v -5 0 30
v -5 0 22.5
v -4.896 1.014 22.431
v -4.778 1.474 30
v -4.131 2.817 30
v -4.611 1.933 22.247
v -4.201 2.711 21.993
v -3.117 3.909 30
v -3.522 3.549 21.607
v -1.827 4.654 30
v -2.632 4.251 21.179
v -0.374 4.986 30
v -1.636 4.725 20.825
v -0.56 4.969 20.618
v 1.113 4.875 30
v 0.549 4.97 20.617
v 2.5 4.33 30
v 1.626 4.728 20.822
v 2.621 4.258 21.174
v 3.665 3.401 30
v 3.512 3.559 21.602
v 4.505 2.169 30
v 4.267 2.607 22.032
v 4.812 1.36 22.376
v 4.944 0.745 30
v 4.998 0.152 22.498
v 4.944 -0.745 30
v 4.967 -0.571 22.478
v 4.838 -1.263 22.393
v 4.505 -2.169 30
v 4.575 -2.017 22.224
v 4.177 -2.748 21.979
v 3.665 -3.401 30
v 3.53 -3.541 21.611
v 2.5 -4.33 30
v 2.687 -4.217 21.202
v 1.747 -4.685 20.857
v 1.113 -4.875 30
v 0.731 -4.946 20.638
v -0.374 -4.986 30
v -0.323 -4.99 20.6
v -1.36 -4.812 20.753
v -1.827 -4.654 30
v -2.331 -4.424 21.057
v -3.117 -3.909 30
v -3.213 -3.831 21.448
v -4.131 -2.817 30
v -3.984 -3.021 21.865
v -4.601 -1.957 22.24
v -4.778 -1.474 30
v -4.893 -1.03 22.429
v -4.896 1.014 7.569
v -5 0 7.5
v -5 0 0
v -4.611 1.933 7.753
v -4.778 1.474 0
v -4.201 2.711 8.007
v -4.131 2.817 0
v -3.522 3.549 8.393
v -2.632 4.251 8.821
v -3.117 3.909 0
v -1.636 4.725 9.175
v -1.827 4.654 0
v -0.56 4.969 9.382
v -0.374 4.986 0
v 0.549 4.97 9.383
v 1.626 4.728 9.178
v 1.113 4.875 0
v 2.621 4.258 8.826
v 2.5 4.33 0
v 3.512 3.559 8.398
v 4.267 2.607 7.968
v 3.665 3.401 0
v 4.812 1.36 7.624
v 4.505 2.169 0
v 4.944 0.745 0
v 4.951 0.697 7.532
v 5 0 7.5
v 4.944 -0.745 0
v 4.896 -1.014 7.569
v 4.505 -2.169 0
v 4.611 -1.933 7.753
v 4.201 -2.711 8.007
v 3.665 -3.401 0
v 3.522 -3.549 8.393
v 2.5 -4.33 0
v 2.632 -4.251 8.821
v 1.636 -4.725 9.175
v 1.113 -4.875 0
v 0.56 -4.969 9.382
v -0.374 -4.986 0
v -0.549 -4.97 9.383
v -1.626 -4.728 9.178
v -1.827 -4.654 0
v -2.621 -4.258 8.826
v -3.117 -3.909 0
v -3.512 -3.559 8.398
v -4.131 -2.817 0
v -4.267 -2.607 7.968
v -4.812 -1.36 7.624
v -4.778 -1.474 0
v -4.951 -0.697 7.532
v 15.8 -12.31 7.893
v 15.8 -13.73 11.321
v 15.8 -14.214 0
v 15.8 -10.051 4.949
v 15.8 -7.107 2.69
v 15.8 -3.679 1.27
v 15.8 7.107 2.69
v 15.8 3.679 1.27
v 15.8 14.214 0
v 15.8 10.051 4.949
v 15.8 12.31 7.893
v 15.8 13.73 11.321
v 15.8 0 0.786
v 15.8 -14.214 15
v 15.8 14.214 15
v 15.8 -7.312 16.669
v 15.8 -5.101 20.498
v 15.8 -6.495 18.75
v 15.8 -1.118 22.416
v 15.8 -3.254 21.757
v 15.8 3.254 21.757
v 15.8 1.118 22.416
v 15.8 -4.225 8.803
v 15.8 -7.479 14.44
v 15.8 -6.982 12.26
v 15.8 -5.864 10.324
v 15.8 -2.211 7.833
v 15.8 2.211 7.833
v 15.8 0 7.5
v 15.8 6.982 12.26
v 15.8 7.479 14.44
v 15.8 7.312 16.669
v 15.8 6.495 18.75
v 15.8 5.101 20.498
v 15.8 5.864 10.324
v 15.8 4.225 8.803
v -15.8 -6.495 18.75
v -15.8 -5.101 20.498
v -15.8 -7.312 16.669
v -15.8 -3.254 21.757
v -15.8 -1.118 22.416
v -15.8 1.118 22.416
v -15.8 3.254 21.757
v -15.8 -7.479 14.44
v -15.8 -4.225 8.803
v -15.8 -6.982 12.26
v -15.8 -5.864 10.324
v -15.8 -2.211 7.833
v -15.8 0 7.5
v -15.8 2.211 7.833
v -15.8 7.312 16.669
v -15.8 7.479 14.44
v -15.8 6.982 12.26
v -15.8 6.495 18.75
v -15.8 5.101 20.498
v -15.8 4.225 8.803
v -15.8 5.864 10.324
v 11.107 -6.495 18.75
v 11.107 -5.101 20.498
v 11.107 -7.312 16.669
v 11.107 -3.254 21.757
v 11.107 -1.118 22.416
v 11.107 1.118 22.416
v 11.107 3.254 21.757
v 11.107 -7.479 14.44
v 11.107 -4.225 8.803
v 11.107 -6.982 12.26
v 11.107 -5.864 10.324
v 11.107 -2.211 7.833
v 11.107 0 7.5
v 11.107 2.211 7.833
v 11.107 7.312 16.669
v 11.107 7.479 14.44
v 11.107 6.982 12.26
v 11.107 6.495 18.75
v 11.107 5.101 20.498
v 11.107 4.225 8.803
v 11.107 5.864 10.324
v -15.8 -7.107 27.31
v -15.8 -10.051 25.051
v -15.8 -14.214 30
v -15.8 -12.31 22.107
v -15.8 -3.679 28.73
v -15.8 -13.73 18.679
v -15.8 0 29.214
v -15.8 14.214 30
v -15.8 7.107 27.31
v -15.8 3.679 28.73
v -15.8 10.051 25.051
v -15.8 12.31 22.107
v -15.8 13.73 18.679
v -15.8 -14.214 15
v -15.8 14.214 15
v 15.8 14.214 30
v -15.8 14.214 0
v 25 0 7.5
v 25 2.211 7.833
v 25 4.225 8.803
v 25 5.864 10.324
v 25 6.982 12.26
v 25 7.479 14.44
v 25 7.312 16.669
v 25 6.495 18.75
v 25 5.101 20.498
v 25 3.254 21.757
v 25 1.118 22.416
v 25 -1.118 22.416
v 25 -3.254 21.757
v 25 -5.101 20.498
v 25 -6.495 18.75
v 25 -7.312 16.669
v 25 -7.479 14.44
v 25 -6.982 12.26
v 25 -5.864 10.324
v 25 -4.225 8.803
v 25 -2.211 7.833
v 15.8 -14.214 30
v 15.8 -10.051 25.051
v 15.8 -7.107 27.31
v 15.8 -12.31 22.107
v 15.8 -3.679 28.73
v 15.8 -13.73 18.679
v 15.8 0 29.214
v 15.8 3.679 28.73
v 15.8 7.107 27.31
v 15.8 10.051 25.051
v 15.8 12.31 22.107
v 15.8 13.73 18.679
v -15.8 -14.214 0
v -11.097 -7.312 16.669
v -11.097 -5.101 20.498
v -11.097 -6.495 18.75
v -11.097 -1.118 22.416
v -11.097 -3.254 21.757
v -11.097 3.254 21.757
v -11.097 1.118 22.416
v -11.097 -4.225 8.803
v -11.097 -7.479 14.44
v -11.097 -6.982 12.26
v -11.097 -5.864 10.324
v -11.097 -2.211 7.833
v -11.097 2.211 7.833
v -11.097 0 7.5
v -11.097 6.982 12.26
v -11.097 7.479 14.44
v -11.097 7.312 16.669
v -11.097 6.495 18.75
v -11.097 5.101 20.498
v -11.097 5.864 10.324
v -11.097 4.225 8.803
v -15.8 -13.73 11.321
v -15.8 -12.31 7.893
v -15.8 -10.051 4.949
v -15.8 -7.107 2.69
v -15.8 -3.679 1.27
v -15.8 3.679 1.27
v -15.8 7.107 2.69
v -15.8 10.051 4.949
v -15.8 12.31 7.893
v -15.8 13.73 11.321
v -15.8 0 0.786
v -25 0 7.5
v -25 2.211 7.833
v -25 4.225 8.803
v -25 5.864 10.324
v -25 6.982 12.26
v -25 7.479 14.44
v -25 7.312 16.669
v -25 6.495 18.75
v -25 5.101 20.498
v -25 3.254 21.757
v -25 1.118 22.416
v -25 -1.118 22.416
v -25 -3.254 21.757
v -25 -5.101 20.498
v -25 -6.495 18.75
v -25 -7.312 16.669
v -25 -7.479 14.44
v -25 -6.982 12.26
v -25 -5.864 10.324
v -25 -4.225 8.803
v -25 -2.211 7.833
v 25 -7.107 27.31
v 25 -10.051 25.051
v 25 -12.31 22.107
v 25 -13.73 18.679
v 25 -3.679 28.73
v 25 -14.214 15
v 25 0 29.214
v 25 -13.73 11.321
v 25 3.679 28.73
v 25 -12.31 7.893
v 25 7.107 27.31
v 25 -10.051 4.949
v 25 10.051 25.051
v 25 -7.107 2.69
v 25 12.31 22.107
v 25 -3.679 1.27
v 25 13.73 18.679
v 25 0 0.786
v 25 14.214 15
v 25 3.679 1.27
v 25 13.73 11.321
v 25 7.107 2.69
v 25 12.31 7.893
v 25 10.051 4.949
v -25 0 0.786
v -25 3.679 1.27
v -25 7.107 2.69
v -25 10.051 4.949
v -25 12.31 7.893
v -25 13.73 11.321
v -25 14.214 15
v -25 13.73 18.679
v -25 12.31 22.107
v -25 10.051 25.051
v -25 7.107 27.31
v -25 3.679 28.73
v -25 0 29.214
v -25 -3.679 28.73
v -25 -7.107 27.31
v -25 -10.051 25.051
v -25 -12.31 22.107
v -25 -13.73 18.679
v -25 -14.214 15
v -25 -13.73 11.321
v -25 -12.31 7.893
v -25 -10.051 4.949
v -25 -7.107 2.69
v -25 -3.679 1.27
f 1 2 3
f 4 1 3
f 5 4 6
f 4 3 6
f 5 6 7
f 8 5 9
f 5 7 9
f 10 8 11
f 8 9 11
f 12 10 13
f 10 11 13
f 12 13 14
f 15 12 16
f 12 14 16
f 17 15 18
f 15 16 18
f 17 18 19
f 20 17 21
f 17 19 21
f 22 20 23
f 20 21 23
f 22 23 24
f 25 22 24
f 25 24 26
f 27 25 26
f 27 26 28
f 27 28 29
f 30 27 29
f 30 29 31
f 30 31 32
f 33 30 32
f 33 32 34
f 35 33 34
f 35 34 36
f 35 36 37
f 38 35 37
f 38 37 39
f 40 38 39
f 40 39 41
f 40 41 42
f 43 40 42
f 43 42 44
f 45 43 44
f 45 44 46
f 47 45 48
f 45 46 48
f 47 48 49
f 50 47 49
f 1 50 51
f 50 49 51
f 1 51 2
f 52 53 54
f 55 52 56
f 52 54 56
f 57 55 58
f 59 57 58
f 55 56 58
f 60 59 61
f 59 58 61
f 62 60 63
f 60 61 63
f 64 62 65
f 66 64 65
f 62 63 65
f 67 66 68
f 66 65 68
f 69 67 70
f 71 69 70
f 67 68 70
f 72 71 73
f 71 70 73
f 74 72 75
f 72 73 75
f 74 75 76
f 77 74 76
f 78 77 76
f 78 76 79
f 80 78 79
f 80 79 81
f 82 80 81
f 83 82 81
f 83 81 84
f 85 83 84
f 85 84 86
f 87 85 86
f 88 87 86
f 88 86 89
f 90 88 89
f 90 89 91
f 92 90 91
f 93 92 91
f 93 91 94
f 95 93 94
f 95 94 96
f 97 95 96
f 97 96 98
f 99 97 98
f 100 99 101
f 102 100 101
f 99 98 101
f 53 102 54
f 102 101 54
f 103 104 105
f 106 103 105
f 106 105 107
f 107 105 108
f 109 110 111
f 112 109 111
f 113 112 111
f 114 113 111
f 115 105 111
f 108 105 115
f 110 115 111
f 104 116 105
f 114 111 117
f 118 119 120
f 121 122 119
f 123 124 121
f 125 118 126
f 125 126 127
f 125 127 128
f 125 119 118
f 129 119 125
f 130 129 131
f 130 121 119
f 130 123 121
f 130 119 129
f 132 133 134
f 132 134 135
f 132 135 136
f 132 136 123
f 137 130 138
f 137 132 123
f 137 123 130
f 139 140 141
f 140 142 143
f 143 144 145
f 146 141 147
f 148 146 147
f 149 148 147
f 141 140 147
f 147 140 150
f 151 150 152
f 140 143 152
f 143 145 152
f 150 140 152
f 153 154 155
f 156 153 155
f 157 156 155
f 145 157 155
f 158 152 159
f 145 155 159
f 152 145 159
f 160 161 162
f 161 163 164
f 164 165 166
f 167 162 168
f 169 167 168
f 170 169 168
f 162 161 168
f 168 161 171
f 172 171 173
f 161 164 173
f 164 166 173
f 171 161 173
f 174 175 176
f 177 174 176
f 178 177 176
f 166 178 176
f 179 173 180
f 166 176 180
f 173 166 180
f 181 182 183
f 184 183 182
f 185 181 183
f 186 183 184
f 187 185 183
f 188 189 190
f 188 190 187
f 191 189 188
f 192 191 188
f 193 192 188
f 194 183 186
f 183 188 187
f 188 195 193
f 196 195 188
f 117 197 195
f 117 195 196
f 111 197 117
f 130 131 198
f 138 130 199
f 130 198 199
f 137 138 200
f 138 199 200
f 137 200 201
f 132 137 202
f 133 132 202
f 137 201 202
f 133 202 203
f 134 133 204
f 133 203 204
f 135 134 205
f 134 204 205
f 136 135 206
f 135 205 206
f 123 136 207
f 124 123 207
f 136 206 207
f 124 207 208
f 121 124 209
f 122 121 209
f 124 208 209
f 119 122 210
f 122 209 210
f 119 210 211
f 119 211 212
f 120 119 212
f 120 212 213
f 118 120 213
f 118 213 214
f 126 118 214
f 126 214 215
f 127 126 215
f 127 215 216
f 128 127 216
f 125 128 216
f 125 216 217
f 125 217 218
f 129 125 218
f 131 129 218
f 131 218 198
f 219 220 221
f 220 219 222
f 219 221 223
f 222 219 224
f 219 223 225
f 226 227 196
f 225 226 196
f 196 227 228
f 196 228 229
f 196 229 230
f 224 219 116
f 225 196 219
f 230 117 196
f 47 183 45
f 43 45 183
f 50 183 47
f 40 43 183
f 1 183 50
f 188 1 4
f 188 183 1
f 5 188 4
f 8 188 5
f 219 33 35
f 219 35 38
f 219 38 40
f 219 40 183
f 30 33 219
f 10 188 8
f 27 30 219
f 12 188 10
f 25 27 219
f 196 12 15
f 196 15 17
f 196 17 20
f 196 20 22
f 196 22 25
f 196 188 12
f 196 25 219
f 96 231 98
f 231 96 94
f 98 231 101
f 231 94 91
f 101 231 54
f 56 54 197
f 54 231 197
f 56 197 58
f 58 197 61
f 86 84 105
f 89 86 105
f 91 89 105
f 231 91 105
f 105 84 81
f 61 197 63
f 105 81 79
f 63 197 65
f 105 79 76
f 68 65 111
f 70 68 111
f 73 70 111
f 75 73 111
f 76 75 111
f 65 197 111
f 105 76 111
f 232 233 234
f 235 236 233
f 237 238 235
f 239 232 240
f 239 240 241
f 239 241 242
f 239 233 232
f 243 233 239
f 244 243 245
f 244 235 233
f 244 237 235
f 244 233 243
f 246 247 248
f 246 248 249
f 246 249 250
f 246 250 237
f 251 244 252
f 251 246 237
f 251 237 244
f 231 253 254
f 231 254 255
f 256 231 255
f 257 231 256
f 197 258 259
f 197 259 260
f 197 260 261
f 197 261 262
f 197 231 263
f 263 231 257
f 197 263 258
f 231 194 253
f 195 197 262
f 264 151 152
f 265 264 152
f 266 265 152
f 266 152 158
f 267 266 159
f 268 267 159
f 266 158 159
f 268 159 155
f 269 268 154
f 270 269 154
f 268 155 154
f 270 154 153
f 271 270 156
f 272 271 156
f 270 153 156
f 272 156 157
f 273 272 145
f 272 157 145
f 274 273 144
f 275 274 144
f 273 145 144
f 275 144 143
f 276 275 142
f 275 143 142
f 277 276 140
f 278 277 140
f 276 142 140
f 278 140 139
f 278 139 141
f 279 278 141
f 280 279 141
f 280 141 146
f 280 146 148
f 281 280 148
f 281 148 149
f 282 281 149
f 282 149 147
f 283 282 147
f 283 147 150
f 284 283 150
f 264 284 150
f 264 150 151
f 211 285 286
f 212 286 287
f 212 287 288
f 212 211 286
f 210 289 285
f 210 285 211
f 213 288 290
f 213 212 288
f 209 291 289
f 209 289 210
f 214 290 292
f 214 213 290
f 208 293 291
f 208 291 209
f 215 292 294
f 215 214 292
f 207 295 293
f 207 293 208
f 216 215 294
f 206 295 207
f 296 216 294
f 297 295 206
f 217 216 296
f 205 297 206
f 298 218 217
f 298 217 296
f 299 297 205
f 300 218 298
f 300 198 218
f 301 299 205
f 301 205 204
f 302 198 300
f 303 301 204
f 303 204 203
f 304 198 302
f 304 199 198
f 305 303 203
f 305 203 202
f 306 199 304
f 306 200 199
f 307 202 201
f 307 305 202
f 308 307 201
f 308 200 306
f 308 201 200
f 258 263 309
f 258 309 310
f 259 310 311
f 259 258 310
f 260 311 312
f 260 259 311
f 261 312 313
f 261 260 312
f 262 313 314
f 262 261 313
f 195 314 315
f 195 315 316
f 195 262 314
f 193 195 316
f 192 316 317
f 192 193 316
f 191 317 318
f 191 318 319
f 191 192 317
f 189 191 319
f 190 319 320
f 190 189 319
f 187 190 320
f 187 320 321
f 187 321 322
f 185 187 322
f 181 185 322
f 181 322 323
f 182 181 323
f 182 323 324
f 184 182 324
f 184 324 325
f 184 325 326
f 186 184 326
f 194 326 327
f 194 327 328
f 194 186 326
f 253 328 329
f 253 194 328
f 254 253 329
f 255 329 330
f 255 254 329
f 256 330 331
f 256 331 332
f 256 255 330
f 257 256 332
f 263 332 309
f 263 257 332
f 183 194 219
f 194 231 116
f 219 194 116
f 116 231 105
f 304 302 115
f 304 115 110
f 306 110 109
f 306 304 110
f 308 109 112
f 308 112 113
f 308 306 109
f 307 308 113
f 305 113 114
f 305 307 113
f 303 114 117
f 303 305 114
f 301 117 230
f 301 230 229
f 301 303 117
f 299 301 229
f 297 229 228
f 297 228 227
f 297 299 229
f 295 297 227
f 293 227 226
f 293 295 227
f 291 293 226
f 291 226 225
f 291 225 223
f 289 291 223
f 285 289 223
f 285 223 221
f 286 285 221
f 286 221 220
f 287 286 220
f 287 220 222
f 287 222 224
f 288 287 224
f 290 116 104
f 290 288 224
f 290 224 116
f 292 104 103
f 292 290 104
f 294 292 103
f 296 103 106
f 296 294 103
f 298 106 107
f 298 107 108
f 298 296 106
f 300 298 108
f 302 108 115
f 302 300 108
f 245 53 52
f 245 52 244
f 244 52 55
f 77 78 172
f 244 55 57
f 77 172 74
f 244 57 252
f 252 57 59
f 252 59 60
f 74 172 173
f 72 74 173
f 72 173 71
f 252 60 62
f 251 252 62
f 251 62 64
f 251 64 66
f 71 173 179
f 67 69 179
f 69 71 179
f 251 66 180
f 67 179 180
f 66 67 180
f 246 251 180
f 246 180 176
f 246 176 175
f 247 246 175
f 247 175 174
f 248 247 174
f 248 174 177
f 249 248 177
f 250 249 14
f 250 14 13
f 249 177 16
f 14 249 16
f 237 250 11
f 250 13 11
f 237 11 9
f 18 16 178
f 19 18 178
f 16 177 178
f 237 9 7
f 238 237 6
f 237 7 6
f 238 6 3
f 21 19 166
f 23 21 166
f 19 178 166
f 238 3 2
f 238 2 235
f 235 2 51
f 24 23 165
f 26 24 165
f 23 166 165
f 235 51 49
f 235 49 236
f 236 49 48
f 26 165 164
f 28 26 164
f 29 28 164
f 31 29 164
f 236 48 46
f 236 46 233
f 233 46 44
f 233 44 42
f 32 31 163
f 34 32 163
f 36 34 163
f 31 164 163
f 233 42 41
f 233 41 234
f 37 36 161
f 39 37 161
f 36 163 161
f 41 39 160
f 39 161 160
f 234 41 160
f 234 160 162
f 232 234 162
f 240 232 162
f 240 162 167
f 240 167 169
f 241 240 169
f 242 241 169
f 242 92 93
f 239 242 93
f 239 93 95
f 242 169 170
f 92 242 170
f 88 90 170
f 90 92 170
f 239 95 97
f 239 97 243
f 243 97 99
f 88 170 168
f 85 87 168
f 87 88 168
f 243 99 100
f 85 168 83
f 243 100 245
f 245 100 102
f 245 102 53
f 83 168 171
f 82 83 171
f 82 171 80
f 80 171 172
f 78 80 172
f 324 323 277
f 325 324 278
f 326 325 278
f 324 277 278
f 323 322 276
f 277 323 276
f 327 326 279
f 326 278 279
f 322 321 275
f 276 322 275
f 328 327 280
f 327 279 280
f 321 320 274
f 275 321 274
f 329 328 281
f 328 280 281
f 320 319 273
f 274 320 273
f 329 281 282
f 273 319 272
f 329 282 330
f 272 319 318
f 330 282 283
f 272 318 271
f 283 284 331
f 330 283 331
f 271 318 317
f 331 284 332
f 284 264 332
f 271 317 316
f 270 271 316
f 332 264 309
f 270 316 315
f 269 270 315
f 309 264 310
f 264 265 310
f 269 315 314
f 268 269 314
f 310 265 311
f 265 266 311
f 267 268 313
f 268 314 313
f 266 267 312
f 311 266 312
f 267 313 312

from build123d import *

# Parameters (mm, degrees)
SKETCH1_W           = 31.6
SKETCH1_H           = 28.428065026
BOSS_EXTRUDE1_DEPTH = 30
SKETCH2_R           = 14.214032513
BOSS_EXTRUDE2_DEPTH = 25
SKETCH3_R           = 7.5
CUT_EXTRUDE1_DEPTH  = 75
SKETCH4_R           = 5
CUT_EXTRUDE2_DEPTH  = 75
BOSS_EXTRUDE3_REACH = 30.428
SKETCH5_W           = 4.702962509
SKETCH5_H           = 30
SKETCH5_W_2         = 4.693068718


with BuildPart() as part:
    # Sketch1 → Boss-Extrude1 (new body)
    with BuildSketch(Plane.XY):
        Rectangle(SKETCH1_W, SKETCH1_H)
    extrude(amount=BOSS_EXTRUDE1_DEPTH)

    # Sketch2 → Boss-Extrude2 (add, symmetric)
    with BuildSketch(Plane(origin=(0, 0, 0), x_dir=(0, 0, -1), z_dir=(1, 0, 0))):
        with Locations((-15, 0)):
            Circle(SKETCH2_R)
    extrude(amount=BOSS_EXTRUDE2_DEPTH, both=True)

    # Sketch3 → Cut-Extrude1 (cut)
    with BuildSketch(Plane(origin=(25, 0, 0), x_dir=(0, 0, -1), z_dir=(1, 0, 0))):
        with Locations((-15, 0)):
            Circle(SKETCH3_R)
    extrude(amount=-CUT_EXTRUDE1_DEPTH, mode=Mode.SUBTRACT)

    # Sketch4 → Cut-Extrude2 (cut)
    with BuildSketch(Plane(origin=(0, 0, 0), x_dir=(-1, 0, 0), z_dir=(0, 0, -1))):
        Circle(SKETCH4_R)
    extrude(amount=-CUT_EXTRUDE2_DEPTH, mode=Mode.SUBTRACT)

    # Sketch5 → Boss-Extrude3 (add, up to next)
    with BuildSketch(Plane(origin=(0, 14.214032513, 0), x_dir=(1, 0, 0), z_dir=(0, 1, 0)), mode=Mode.PRIVATE) as boss_extrude3_sk1:
        with Locations((-13.448518745, -15)):
            Rectangle(SKETCH5_W, SKETCH5_H)
    boss_extrude3_tool1 = extrude(boss_extrude3_sk1.sketch, amount=-BOSS_EXTRUDE3_REACH, mode=Mode.PRIVATE) - part.part
    add(boss_extrude3_tool1.solids().sort_by_distance((-13.448519, 14.214033, 15))[0])
    # Sketch5 → Boss-Extrude3 (add, up to next)
    with BuildSketch(Plane(origin=(0, 14.214032513, 0), x_dir=(1, 0, 0), z_dir=(0, 1, 0)), mode=Mode.PRIVATE) as boss_extrude3_sk2:
        with Locations((13.453465641, -15)):
            Rectangle(SKETCH5_W_2, SKETCH5_H)
    boss_extrude3_tool2 = extrude(boss_extrude3_sk2.sketch, amount=-BOSS_EXTRUDE3_REACH, mode=Mode.PRIVATE) - part.part
    add(boss_extrude3_tool2.solids().sort_by_distance((13.453466, 14.214033, 15))[0])


solid = part.part
